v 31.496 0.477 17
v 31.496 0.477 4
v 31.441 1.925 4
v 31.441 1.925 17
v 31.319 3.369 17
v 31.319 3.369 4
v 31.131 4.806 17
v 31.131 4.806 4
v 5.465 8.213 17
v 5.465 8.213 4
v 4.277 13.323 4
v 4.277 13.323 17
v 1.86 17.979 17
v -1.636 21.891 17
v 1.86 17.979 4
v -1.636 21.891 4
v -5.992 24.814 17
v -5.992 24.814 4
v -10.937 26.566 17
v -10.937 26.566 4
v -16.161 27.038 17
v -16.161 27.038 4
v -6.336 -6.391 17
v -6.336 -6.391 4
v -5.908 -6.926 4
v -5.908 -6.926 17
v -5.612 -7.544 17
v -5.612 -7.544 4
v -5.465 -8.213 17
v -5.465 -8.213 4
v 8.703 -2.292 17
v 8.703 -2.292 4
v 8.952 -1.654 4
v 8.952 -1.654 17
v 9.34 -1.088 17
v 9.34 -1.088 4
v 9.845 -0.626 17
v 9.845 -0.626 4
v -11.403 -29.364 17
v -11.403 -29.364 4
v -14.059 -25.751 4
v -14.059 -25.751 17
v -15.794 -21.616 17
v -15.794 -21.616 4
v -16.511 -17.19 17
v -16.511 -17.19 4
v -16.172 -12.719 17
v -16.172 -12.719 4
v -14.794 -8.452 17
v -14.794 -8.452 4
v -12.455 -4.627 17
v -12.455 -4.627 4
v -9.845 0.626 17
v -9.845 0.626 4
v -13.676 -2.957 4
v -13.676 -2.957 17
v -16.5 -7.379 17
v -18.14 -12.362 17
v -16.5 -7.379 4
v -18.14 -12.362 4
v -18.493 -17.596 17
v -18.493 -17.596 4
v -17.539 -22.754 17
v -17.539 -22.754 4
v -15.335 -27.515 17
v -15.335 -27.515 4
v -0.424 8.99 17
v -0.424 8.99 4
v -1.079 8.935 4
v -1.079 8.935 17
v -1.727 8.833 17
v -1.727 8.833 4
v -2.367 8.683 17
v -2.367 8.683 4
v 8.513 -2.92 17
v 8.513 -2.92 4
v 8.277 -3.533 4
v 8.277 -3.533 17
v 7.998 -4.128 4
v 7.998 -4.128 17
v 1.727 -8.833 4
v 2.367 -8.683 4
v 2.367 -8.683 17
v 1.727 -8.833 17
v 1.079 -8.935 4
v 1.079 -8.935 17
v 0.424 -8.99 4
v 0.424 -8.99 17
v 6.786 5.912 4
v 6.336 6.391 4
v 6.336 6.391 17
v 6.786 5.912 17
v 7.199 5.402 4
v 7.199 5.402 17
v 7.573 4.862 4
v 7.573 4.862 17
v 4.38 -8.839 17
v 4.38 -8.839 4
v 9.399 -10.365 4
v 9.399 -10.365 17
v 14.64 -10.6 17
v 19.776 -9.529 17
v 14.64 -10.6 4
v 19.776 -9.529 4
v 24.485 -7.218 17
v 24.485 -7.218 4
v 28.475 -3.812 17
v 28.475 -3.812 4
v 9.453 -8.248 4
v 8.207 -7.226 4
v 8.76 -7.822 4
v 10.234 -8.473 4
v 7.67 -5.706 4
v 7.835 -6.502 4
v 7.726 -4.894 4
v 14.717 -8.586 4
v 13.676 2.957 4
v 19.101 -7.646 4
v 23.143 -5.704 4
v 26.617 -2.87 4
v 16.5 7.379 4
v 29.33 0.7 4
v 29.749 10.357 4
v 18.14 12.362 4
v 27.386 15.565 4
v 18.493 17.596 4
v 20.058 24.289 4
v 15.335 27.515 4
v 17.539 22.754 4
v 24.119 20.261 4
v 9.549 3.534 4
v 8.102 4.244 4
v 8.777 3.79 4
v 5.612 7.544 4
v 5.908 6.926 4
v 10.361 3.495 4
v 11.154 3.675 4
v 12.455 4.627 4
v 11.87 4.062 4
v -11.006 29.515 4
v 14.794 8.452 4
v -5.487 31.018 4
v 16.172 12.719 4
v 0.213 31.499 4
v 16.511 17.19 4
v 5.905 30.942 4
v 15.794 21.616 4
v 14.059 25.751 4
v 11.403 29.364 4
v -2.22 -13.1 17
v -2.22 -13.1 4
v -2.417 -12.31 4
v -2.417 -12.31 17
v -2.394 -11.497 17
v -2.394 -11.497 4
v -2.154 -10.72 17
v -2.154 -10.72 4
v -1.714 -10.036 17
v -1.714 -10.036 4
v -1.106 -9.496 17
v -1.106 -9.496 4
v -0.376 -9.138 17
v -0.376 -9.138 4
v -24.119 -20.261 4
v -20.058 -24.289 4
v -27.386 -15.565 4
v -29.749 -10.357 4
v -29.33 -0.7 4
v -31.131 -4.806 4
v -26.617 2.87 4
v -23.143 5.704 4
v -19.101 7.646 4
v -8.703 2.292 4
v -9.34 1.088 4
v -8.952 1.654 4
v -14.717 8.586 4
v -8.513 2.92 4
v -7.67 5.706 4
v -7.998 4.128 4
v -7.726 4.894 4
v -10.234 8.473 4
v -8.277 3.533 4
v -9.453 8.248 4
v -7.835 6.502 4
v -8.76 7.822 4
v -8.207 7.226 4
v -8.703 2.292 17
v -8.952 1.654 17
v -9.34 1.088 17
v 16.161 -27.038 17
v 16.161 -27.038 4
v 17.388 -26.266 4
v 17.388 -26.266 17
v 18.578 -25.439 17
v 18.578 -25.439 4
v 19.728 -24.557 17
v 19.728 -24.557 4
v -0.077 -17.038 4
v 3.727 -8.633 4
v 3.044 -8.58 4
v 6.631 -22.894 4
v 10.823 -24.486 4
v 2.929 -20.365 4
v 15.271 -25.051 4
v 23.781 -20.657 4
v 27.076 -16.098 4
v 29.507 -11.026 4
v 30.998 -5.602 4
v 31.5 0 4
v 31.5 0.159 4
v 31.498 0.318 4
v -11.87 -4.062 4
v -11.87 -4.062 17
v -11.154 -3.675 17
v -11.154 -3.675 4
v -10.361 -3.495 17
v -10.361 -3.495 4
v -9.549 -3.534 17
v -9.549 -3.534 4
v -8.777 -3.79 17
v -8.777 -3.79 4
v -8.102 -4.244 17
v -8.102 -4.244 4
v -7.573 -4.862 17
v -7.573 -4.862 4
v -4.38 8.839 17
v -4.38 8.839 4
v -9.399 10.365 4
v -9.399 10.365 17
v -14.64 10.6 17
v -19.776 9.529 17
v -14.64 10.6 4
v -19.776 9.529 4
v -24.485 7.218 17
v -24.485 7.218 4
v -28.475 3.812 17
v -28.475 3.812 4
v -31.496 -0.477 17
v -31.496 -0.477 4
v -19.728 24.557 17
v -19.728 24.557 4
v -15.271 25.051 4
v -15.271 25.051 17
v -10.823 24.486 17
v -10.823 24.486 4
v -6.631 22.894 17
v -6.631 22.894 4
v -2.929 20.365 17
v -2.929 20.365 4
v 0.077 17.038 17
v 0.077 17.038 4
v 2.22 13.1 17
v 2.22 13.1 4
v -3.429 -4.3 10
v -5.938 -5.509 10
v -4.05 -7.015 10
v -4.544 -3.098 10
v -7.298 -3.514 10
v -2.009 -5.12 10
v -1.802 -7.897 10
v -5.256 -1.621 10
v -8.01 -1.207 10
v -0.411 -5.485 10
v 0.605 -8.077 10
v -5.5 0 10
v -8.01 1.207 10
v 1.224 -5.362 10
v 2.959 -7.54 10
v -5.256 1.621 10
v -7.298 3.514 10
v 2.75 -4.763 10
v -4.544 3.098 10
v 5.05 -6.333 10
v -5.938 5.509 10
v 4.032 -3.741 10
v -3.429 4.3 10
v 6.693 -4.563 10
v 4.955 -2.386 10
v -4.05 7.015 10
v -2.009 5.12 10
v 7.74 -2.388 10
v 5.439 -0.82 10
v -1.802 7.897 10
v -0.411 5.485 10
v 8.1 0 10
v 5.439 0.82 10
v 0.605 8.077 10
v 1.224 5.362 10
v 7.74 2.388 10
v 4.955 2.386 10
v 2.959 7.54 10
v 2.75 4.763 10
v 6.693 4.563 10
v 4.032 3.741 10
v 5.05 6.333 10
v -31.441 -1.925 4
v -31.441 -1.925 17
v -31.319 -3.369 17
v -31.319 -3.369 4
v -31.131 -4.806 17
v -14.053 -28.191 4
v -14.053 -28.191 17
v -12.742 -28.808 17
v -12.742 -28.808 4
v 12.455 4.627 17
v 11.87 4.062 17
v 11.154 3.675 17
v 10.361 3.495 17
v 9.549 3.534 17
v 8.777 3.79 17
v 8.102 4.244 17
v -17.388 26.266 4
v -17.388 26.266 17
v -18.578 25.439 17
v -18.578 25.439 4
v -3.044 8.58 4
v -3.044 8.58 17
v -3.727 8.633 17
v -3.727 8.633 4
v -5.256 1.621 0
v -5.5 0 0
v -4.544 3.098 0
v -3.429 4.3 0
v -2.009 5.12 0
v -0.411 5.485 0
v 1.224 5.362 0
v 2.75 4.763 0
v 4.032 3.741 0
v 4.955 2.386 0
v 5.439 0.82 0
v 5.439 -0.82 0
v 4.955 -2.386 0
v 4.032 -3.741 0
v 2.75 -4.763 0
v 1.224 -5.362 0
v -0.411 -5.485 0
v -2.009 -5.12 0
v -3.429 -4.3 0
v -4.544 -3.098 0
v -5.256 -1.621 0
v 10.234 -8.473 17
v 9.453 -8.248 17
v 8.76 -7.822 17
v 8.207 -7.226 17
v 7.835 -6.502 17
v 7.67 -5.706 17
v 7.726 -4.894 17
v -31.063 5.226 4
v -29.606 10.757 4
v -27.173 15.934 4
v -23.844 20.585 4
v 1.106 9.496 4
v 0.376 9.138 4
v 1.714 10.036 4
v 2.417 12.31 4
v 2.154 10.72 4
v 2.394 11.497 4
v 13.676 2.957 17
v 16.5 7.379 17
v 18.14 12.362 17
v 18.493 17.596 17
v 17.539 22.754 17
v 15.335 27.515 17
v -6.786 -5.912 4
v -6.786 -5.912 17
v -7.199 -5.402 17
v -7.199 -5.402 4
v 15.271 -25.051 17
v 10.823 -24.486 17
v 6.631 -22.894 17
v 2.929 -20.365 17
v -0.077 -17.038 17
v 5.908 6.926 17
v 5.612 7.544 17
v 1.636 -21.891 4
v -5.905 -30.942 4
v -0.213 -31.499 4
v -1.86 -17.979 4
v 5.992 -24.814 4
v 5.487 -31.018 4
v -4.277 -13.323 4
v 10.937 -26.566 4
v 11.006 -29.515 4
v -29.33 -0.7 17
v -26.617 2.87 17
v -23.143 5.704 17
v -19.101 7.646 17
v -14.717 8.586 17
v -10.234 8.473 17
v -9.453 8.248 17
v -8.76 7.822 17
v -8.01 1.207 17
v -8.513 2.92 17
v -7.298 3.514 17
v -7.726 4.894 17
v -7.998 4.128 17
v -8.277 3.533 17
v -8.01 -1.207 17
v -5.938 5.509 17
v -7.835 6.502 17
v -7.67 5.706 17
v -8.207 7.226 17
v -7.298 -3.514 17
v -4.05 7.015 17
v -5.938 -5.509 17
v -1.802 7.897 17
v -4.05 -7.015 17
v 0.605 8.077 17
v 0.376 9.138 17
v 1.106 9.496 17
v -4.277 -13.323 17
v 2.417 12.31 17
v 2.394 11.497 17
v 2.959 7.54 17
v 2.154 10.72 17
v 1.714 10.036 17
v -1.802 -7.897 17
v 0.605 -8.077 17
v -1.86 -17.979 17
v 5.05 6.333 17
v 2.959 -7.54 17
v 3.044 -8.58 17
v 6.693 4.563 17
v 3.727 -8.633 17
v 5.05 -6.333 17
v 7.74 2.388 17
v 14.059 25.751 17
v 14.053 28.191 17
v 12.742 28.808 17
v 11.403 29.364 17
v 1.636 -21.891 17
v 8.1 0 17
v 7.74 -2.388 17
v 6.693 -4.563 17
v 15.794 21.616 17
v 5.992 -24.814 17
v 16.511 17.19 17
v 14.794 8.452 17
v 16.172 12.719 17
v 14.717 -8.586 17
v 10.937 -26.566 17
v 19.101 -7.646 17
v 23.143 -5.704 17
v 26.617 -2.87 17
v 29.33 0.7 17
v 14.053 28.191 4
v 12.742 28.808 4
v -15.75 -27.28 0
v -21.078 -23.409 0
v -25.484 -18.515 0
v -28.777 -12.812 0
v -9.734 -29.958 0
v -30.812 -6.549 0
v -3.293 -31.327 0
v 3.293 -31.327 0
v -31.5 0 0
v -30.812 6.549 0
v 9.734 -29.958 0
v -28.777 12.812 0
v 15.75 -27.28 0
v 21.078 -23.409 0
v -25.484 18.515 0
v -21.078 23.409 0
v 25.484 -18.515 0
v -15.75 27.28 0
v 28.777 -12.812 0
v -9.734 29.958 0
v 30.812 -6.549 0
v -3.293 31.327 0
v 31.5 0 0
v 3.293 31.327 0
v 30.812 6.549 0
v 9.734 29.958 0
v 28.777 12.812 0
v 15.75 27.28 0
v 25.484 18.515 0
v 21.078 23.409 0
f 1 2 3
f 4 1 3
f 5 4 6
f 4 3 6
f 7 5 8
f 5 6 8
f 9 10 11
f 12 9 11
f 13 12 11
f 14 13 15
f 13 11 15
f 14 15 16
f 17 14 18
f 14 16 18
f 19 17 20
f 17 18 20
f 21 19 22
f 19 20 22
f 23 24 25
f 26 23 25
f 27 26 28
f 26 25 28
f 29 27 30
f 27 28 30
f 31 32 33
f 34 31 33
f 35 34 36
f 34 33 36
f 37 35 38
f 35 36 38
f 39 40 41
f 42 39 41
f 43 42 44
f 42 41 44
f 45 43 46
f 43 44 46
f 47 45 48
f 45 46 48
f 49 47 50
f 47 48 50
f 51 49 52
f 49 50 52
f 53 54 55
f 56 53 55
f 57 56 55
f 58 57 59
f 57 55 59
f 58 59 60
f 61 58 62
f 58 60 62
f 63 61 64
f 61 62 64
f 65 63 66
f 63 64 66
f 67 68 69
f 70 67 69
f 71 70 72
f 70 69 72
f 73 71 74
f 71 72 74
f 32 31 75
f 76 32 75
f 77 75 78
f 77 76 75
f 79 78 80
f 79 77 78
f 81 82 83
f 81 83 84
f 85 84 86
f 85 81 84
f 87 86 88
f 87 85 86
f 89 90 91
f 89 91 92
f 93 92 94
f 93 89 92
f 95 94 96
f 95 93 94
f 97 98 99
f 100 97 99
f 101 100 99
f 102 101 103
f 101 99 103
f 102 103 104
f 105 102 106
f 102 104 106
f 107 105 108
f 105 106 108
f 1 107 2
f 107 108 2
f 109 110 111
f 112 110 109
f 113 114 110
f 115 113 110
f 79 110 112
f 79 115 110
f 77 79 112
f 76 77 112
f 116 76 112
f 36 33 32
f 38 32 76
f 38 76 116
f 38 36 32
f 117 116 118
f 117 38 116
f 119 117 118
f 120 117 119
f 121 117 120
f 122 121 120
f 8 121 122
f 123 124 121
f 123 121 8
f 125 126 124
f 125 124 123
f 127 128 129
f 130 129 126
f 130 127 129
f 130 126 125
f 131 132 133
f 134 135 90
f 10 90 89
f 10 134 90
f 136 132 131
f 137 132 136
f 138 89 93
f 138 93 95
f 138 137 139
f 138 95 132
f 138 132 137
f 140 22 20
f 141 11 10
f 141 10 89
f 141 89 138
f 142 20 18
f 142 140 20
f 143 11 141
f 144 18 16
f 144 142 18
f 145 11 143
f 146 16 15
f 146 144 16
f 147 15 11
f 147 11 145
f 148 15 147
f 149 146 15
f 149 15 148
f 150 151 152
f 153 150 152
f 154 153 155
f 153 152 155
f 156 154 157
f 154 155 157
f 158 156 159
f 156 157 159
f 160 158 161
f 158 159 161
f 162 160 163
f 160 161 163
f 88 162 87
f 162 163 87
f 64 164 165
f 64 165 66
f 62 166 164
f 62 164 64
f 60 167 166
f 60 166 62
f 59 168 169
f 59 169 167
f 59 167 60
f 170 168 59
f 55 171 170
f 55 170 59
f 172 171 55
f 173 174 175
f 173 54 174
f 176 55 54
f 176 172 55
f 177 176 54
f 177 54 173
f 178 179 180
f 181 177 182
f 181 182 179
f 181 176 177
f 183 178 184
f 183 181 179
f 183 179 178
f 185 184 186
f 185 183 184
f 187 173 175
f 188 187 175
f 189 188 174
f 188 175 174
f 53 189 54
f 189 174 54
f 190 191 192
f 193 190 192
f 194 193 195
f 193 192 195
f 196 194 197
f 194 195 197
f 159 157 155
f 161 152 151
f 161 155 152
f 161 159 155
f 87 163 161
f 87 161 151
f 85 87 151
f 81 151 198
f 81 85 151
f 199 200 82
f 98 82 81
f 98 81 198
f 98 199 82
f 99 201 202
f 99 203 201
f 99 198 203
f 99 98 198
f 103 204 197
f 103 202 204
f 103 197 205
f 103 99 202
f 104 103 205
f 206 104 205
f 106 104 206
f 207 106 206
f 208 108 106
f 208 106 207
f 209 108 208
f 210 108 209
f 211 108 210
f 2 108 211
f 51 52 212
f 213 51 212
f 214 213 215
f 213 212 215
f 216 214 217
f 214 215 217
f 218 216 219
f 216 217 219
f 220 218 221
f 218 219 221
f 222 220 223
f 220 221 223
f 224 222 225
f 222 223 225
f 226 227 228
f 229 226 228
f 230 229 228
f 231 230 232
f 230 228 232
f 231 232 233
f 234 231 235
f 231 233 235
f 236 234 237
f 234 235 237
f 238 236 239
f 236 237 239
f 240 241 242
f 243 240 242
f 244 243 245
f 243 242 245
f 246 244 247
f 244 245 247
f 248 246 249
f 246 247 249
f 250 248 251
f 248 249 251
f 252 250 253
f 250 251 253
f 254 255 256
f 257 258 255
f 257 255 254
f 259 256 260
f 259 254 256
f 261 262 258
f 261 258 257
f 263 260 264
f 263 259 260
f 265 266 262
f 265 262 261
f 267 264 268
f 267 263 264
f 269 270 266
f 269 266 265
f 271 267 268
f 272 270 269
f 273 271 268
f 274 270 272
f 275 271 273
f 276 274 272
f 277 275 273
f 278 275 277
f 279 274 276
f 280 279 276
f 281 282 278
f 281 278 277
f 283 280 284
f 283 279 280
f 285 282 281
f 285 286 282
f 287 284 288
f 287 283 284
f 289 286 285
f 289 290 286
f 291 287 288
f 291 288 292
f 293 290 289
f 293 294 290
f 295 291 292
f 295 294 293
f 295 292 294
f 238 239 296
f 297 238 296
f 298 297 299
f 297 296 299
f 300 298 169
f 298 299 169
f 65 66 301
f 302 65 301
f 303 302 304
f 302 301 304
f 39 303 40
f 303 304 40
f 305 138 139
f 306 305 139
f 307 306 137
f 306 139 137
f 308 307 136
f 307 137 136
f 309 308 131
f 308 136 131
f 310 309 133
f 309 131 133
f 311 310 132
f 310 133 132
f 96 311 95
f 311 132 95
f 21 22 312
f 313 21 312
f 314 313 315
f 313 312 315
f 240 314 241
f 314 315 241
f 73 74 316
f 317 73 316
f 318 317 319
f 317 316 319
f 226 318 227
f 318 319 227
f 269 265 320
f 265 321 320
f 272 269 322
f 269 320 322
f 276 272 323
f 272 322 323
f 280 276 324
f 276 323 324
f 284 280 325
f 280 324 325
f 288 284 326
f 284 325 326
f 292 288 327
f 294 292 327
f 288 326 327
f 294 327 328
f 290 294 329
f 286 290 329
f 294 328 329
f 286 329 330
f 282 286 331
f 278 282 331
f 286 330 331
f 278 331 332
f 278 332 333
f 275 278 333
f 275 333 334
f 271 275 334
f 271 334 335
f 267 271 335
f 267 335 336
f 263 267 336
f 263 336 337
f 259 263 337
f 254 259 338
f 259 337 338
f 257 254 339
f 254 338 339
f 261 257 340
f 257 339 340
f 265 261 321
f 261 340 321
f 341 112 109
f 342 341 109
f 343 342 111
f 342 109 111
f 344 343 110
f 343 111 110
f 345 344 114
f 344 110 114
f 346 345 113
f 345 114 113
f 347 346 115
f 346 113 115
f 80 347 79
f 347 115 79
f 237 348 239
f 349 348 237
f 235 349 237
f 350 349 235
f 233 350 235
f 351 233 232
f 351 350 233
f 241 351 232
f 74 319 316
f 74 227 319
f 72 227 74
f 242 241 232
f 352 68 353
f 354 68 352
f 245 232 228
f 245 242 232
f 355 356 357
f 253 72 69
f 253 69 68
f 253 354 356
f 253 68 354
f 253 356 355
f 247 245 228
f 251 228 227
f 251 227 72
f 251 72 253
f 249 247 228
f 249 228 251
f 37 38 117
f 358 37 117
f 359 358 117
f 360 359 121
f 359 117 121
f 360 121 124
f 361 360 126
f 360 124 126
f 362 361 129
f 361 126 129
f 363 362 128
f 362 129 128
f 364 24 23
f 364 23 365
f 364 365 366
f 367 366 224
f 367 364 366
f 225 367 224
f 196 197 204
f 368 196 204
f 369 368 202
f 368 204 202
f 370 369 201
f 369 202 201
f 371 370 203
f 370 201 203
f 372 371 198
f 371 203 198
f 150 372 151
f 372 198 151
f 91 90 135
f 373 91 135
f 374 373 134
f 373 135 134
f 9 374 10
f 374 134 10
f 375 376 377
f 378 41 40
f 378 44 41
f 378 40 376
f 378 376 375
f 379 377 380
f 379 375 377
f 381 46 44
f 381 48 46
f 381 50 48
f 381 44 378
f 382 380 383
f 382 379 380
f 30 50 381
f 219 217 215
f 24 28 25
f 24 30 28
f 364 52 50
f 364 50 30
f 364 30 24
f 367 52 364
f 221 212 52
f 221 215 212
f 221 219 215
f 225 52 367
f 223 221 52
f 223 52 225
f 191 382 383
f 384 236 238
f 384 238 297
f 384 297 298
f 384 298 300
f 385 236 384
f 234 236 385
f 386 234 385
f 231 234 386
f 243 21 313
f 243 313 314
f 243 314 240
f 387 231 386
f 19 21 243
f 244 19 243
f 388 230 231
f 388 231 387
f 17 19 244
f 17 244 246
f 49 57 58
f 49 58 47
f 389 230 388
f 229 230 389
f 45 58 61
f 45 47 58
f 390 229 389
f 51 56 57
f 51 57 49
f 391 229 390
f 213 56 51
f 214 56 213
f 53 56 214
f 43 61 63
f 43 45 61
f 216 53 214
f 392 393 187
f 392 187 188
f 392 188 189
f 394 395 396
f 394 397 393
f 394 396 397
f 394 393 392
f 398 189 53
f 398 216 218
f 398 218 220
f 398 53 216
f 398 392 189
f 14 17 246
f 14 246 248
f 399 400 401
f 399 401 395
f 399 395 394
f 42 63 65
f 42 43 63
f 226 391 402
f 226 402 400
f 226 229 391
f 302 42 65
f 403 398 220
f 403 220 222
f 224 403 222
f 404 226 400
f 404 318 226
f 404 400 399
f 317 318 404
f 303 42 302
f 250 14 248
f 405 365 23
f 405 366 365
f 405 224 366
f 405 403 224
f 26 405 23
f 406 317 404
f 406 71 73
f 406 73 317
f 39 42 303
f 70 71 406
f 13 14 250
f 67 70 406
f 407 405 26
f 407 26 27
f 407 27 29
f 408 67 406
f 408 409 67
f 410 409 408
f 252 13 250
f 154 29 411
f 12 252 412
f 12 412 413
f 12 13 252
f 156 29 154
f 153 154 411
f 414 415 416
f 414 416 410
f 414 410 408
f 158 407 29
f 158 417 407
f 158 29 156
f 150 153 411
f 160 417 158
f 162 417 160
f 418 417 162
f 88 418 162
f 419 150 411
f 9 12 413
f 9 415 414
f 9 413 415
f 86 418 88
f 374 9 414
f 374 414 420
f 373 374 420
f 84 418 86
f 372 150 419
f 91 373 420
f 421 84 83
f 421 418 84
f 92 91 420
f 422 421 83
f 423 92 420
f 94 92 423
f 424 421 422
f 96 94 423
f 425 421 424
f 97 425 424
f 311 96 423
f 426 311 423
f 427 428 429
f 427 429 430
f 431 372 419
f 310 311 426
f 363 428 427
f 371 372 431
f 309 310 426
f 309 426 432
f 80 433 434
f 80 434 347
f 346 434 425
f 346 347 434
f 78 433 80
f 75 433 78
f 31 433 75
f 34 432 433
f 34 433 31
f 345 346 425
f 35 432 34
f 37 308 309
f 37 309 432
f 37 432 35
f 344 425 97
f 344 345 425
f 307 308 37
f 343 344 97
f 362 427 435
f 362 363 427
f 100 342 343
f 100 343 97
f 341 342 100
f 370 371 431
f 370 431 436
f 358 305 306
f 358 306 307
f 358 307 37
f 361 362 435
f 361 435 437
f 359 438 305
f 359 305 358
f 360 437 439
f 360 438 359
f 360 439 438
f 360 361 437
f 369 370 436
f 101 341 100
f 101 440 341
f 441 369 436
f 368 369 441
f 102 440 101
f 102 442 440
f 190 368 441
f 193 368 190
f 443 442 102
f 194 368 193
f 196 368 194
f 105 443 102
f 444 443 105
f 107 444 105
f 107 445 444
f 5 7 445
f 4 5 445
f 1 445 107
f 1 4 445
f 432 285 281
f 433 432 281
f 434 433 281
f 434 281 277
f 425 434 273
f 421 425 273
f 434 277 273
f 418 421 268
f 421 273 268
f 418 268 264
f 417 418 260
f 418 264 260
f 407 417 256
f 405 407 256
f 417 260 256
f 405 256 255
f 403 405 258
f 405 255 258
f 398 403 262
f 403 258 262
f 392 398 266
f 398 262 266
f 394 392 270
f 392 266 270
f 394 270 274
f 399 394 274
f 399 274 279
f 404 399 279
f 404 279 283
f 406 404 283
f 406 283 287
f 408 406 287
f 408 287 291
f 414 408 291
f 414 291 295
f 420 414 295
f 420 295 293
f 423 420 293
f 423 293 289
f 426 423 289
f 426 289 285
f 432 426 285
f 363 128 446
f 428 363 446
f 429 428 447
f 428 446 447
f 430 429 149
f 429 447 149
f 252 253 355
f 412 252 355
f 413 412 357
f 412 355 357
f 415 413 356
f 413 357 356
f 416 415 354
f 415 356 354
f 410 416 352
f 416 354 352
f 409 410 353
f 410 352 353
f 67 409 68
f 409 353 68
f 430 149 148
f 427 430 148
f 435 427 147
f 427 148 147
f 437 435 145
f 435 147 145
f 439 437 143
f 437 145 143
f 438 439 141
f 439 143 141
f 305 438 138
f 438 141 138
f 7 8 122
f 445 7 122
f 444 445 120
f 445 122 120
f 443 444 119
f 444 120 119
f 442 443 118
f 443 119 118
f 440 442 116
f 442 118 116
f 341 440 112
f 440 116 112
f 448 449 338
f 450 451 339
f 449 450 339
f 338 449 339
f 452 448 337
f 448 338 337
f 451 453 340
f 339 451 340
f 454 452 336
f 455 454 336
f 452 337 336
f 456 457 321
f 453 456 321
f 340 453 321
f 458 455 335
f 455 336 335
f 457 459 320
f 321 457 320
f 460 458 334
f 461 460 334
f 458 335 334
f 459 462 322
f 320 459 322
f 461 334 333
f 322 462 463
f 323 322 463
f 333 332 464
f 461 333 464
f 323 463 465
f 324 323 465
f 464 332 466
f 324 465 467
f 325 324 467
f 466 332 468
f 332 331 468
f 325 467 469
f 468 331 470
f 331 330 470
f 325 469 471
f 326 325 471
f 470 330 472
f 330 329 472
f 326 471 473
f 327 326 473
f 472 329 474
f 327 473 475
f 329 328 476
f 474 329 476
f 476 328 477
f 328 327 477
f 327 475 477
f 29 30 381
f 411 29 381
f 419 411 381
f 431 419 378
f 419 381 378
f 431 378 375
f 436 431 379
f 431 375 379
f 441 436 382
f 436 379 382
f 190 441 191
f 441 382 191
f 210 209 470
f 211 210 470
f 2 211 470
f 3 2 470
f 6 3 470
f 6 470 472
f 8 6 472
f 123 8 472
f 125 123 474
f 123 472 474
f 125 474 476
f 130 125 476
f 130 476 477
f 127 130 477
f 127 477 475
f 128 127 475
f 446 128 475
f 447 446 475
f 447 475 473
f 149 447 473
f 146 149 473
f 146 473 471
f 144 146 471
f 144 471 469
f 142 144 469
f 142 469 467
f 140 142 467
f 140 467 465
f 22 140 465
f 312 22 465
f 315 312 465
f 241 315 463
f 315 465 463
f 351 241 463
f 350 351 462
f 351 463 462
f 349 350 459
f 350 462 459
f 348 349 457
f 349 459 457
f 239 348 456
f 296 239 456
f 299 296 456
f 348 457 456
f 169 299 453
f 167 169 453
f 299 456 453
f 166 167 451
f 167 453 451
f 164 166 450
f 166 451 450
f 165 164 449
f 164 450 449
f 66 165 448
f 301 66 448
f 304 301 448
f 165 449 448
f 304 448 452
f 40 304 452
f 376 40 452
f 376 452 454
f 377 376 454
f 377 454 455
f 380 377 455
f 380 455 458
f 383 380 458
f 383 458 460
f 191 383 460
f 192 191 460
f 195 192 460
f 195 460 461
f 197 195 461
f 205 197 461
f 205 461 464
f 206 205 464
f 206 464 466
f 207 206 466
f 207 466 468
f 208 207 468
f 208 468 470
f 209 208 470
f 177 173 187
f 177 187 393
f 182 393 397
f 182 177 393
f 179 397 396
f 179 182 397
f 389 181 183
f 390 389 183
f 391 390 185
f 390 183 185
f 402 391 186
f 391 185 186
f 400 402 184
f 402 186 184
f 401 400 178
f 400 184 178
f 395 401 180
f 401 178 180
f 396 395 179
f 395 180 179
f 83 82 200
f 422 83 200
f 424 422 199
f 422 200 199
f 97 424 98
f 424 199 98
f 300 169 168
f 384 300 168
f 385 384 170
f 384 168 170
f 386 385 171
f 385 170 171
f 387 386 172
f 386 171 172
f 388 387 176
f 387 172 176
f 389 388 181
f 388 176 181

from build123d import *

# Parameters (mm, degrees)
SKETCH1_R                     = 31.5
EXTRUDE1_DEPTH                = 4
SKETCH3_R                     = 9
EXTRUDE2_DEPTH                = 6
M11_0_11_DIAMETER_HOLE1_D     = 11
M11_0_11_DIAMETER_HOLE1_DEPTH = 10
M11_0_11_DIAMETER_HOLE1_TIP   = 3.304733405
EXTRUDE4_DEPTH                = 13
CIRPATTERN2_COUNT             = 6
SKETCH7_R                     = 9
SKETCH7_R_2                   = 8.1
EXTRUDE5_DEPTH                = 17


with BuildPart() as part:
    # Sketch1 → Extrude1 (new body)
    with BuildSketch(Plane.XY):
        Circle(SKETCH1_R)
    extrude(amount=EXTRUDE1_DEPTH)

    # Sketch3 → Extrude2 (add)
    with BuildSketch(Plane.XY.offset(4)):
        Circle(SKETCH3_R)
    extrude(amount=EXTRUDE2_DEPTH)

    # M11.0 _11_ Diameter Hole1
    with Locations(Plane.XY.offset(10)):
        with Locations((0, 0)):
            Hole(M11_0_11_DIAMETER_HOLE1_D / 2, depth=M11_0_11_DIAMETER_HOLE1_DEPTH)
            with Locations((0, 0, -(M11_0_11_DIAMETER_HOLE1_DEPTH + M11_0_11_DIAMETER_HOLE1_TIP / 2))):  # 118° drill point
                Cone(0, M11_0_11_DIAMETER_HOLE1_D / 2, M11_0_11_DIAMETER_HOLE1_TIP, mode=Mode.SUBTRACT)

    # Sketch2_8 → Extrude4 (add)
    with BuildSketch(Plane.XY.offset(4)):
        with BuildLine():
            ThreePointArc((-9.844910533, 0.62593686), (-18.139880625, -12.361871339), (-15.335083755, -27.515181378))
            ThreePointArc((-15.335083755, -27.515181378), (-13.401012303, -28.5072424), (-11.403128973, -29.363559894))
            ThreePointArc((-11.403128973, -29.363559894), (-16.511325203, -17.190045629), (-12.454740571, -4.626915468))
            ThreePointArc((-12.454740571, -4.626915468), (-9.953426801, -3.486629519), (-7.573470906, -4.862359348))
            ThreePointArc((-7.573470906, -4.862359348), (-8.889824652, -1.403929362), (-8.703301392, 2.291843117))
            ThreePointArc((-8.703301392, 2.291843117), (-9.129712004, 1.359939965), (-9.844910533, 0.62593686))
        make_face()
    extrude4 = extrude(amount=EXTRUDE4_DEPTH)

    # CirPattern2: Extrude4 ×6 about axis
    cirpattern2_axis = Axis((0, 0, 0), (0, 0, 1))
    for i in range(1, CIRPATTERN2_COUNT):
        add(extrude4.rotate(cirpattern2_axis, i * 360 / CIRPATTERN2_COUNT))

    # Sketch7 → Extrude5 (add)
    with BuildSketch(Plane(origin=(0, 0, 0), x_dir=(-1, 0, 0), z_dir=(0, 0, -1))):
        Circle(SKETCH7_R)
        with Locations(Location((0, 0, 0), (0, 0, 180))):  # turned: the seam where the file's is
            Circle(SKETCH7_R_2, mode=Mode.SUBTRACT)
    extrude(amount=-EXTRUDE5_DEPTH)


solid = part.part
